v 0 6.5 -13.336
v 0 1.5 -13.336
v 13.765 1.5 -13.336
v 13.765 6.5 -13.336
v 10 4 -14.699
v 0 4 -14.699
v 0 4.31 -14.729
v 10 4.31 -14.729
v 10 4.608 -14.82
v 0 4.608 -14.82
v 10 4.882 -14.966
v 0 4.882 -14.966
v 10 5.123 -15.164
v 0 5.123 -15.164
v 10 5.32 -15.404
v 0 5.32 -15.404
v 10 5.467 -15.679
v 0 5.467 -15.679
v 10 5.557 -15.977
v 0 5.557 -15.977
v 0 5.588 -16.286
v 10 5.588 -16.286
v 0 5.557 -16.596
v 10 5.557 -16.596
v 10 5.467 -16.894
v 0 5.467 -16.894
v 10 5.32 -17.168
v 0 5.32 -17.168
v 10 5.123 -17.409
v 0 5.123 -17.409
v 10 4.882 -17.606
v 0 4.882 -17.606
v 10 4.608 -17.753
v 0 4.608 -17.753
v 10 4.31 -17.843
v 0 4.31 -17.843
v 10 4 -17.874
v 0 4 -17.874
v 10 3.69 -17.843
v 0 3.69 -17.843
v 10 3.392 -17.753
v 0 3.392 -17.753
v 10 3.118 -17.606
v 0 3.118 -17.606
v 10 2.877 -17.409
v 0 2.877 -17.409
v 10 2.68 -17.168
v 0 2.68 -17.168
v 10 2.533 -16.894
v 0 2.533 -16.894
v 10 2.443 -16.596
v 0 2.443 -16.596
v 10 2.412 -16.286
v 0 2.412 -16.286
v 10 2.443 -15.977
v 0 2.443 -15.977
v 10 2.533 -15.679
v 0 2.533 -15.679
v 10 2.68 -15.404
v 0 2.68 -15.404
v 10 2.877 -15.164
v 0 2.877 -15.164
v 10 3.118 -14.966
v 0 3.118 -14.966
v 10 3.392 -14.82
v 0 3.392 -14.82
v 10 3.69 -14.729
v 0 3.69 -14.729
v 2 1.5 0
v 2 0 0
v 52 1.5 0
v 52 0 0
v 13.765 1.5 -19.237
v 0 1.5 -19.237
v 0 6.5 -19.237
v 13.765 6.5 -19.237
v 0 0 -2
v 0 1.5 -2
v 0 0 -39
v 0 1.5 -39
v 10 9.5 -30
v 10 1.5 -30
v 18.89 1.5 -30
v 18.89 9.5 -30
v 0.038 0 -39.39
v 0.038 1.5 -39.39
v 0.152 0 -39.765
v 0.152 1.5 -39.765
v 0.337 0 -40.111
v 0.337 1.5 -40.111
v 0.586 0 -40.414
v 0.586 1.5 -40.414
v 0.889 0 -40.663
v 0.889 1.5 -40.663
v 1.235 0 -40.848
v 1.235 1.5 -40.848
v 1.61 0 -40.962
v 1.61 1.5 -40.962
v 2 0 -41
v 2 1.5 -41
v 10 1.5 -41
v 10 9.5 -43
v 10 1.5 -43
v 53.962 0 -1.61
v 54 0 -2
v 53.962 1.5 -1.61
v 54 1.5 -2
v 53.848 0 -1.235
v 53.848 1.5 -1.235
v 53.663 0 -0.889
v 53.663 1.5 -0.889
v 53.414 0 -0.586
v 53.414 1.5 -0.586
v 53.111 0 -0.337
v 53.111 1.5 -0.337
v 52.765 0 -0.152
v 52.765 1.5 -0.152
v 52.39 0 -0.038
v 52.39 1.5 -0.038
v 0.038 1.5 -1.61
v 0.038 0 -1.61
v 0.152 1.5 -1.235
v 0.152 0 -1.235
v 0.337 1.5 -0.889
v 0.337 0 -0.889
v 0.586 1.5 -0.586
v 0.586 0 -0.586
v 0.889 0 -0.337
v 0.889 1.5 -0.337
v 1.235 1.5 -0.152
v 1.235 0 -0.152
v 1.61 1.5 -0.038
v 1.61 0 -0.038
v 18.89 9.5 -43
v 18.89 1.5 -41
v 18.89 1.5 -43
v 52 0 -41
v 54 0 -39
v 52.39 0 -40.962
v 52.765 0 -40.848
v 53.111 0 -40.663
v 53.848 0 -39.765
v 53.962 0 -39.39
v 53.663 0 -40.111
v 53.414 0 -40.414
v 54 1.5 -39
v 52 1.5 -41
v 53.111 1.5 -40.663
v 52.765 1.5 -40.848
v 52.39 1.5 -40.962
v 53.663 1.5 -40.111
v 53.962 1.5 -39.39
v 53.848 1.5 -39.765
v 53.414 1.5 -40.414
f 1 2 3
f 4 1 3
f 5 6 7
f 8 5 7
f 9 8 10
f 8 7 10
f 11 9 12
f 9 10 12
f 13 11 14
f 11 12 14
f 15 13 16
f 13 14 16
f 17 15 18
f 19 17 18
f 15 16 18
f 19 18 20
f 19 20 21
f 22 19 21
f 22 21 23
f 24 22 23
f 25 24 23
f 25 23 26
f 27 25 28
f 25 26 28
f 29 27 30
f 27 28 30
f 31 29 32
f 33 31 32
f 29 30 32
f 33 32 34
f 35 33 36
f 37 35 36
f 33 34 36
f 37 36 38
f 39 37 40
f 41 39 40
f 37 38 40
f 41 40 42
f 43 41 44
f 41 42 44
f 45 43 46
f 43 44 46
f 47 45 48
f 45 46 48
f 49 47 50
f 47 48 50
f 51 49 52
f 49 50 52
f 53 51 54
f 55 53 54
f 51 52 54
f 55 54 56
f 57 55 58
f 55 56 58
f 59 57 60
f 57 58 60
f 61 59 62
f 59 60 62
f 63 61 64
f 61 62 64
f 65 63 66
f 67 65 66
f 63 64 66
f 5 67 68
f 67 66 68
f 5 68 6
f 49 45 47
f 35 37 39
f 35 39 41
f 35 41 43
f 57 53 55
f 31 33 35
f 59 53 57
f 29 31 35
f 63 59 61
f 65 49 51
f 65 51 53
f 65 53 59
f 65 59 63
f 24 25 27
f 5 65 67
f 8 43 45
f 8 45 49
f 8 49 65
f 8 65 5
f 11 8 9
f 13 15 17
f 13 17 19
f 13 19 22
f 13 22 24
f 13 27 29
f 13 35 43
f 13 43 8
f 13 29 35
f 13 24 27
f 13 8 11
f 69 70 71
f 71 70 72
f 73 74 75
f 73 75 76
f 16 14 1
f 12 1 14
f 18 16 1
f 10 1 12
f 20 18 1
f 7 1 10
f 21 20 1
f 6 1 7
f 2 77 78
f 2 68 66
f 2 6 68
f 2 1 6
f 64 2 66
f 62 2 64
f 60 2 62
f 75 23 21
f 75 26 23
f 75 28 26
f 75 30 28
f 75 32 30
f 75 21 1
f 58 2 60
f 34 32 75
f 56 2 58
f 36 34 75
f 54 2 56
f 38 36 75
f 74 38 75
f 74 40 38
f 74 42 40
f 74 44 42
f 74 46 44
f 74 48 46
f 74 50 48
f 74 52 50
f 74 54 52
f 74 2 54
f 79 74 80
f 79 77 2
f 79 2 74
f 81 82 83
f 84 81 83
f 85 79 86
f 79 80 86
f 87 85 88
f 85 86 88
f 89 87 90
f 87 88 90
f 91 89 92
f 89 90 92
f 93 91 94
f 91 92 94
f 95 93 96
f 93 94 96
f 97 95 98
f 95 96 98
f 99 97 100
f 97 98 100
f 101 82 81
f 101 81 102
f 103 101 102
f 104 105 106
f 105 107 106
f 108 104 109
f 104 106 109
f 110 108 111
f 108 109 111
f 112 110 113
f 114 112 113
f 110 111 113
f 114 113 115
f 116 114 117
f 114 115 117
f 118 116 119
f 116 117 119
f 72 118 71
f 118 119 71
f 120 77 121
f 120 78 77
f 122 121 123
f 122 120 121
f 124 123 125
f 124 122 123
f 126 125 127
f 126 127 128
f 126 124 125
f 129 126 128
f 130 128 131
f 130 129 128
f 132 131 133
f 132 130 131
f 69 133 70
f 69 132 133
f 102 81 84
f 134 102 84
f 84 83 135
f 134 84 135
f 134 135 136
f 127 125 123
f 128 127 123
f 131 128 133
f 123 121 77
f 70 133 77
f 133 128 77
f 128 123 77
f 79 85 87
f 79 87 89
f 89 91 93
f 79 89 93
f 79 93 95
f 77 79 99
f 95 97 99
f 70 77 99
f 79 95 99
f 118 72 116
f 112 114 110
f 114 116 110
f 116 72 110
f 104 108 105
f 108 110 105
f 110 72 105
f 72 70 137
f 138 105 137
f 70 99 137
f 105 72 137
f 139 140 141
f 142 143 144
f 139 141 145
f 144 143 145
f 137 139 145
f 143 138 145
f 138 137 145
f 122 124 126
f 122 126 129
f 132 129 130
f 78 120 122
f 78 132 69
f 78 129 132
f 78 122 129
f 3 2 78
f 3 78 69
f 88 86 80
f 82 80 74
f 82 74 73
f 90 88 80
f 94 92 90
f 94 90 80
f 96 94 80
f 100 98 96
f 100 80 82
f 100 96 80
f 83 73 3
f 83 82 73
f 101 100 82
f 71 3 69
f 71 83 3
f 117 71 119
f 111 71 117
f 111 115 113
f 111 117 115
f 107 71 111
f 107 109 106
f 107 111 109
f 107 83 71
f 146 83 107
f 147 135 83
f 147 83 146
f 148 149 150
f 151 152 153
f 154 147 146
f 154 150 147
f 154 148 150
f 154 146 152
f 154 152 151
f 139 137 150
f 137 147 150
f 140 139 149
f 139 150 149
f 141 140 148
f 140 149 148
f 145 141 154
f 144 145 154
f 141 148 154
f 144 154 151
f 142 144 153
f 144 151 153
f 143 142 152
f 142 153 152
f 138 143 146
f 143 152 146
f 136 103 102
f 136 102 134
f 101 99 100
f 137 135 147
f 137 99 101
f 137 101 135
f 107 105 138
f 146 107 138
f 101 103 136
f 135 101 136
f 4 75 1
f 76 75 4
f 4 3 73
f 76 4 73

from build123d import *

# Parameters (mm, degrees)
SKETCH1_W           = 54
SKETCH1_H           = 41
BOSS_EXTRUDE1_DEPTH = 1.5
SKETCH2_W           = 8.89
SKETCH2_H           = 13
BOSS_EXTRUDE2_DEPTH = 8
FILLET1_R           = 2
SKETCH3_W           = 13.765008066
SKETCH3_H           = 5.90131675
BOSS_EXTRUDE3_DEPTH = 5
SKETCH4_R           = 1.5875
CUT_EXTRUDE1_DEPTH  = 10


with BuildPart() as part:
    # Sketch1 → Boss-Extrude1 (new body)
    with BuildSketch(Plane(origin=(0, 0, 0), x_dir=(1, 0, 0), z_dir=(0, 1, 0))):
        with Locations((27, 20.5)):
            Rectangle(SKETCH1_W, SKETCH1_H)
    extrude(amount=BOSS_EXTRUDE1_DEPTH)

    # Sketch2 → Boss-Extrude2 (add)
    with BuildSketch(Plane(origin=(0, 1.5, 0), x_dir=(1, 0, 0), z_dir=(0, 1, 0))):
        with Locations((14.445, 36.5)):
            Rectangle(SKETCH2_W, SKETCH2_H)
    extrude(amount=BOSS_EXTRUDE2_DEPTH)

    # Fillet1
    fillet1_edges = [part.edges().sort_by_distance(p)[0] for p in [
        (0, 0.75, -41),
        (54, 0.75, -41),
        (54, 0.75, 0),
        (0, 0.75, 0),
    ]]
    fillet(fillet1_edges, radius=FILLET1_R)

    # Sketch3 → Boss-Extrude3 (add)
    with BuildSketch(Plane(origin=(0, 1.5, 0), x_dir=(1, 0, 0), z_dir=(0, 1, 0))):
        with Locations((6.882504033, 16.286215299)):
            Rectangle(SKETCH3_W, SKETCH3_H)
    extrude(amount=BOSS_EXTRUDE3_DEPTH)

    # Sketch4 → Cut-Extrude1 (cut)
    with BuildSketch(Plane.ZY):
        with Locations((-16.286215299, 4)):
            Circle(SKETCH4_R)
    extrude(amount=-CUT_EXTRUDE1_DEPTH, mode=Mode.SUBTRACT)


solid = part.part
